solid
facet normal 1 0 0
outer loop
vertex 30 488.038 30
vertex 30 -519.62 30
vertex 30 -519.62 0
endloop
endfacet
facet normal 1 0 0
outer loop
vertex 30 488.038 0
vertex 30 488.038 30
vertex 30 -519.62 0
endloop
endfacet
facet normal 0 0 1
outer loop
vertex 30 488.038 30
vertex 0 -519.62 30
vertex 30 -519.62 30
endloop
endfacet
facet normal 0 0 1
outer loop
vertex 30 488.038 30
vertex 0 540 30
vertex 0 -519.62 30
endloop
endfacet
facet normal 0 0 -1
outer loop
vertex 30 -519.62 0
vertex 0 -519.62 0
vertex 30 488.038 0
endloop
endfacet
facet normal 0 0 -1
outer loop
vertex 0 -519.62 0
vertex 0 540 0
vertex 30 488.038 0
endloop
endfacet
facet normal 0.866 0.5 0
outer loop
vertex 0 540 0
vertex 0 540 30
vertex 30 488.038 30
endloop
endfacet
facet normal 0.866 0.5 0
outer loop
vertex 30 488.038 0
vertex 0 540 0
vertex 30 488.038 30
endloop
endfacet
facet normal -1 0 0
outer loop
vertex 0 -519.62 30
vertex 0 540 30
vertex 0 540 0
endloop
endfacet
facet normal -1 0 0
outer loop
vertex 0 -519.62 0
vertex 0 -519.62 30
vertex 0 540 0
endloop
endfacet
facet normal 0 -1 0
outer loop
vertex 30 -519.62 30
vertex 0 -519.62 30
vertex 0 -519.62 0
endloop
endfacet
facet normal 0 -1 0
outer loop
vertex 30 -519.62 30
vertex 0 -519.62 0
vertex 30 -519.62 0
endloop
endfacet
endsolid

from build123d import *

# Parameters (mm, degrees)
SKETCH_1_W          = 30
SKETCH_1_H          = 30
EXTRUDE_1_DEPTH     = 600
CUT_EXTRUDE_1_REACH = 603.498
CUT_EXTRUDE_2_REACH = 603.498
EXTRUDE_2_DEPTH     = 30
CUT_EXTRUDE_3_DEPTH = 30


with BuildPart() as part:
    # 草图1 → 凸台-拉伸1 (new body)
    with BuildSketch(Plane(origin=(0, 0, 0), x_dir=(1, 0, 0), z_dir=(0, 1, 0))):
        with Locations((15, -15)):
            Rectangle(SKETCH_1_W, SKETCH_1_H)
    extrude(amount=EXTRUDE_1_DEPTH)

    # 草图2 → 切除-拉伸1 (cut, up to next)
    with BuildSketch(Plane.XY.offset(30), mode=Mode.PRIVATE) as cut_extrude_1_sk1:
        Polygon((0, 0), (30, 8.038475773), (30, 0), align=None)
    cut_extrude_1_tool1 = extrude(cut_extrude_1_sk1.sketch, amount=-CUT_EXTRUDE_1_REACH, mode=Mode.PRIVATE) & part.part
    add(cut_extrude_1_tool1.solids().sort_by_distance((20, 2.679492, 30))[0], mode=Mode.SUBTRACT)

    # 草图3 → 切除-拉伸2 (cut, up to next)
    with BuildSketch(Plane(origin=(0, 0, 0), x_dir=(-1, 0, 0), z_dir=(0, 0, -1)), mode=Mode.PRIVATE) as cut_extrude_2_sk1:
        Polygon((0, 600), (-30, 600), (-30, 488.038475773), align=None)
    cut_extrude_2_tool1 = extrude(cut_extrude_2_sk1.sketch, amount=-CUT_EXTRUDE_2_REACH, mode=Mode.PRIVATE) & part.part
    add(cut_extrude_2_tool1.solids().sort_by_distance((20, 562.679492, 0))[0], mode=Mode.SUBTRACT)

    # 草图4 → 凸台-拉伸2 (add)
    with BuildSketch(Plane.XY.offset(30)):
        Polygon((0, 600), (0, -519.62), (30, -519.62), (30, 488.038475773), align=None)
    extrude(amount=-EXTRUDE_2_DEPTH)

    # 草图5 → 切除-拉伸3 (cut)
    with BuildSketch(Plane.XY.offset(30)):
        Polygon((0, 600), (0, 540), (30, 488.038475773), align=None)
    extrude(amount=-CUT_EXTRUDE_3_DEPTH, mode=Mode.SUBTRACT)


solid = part.part
